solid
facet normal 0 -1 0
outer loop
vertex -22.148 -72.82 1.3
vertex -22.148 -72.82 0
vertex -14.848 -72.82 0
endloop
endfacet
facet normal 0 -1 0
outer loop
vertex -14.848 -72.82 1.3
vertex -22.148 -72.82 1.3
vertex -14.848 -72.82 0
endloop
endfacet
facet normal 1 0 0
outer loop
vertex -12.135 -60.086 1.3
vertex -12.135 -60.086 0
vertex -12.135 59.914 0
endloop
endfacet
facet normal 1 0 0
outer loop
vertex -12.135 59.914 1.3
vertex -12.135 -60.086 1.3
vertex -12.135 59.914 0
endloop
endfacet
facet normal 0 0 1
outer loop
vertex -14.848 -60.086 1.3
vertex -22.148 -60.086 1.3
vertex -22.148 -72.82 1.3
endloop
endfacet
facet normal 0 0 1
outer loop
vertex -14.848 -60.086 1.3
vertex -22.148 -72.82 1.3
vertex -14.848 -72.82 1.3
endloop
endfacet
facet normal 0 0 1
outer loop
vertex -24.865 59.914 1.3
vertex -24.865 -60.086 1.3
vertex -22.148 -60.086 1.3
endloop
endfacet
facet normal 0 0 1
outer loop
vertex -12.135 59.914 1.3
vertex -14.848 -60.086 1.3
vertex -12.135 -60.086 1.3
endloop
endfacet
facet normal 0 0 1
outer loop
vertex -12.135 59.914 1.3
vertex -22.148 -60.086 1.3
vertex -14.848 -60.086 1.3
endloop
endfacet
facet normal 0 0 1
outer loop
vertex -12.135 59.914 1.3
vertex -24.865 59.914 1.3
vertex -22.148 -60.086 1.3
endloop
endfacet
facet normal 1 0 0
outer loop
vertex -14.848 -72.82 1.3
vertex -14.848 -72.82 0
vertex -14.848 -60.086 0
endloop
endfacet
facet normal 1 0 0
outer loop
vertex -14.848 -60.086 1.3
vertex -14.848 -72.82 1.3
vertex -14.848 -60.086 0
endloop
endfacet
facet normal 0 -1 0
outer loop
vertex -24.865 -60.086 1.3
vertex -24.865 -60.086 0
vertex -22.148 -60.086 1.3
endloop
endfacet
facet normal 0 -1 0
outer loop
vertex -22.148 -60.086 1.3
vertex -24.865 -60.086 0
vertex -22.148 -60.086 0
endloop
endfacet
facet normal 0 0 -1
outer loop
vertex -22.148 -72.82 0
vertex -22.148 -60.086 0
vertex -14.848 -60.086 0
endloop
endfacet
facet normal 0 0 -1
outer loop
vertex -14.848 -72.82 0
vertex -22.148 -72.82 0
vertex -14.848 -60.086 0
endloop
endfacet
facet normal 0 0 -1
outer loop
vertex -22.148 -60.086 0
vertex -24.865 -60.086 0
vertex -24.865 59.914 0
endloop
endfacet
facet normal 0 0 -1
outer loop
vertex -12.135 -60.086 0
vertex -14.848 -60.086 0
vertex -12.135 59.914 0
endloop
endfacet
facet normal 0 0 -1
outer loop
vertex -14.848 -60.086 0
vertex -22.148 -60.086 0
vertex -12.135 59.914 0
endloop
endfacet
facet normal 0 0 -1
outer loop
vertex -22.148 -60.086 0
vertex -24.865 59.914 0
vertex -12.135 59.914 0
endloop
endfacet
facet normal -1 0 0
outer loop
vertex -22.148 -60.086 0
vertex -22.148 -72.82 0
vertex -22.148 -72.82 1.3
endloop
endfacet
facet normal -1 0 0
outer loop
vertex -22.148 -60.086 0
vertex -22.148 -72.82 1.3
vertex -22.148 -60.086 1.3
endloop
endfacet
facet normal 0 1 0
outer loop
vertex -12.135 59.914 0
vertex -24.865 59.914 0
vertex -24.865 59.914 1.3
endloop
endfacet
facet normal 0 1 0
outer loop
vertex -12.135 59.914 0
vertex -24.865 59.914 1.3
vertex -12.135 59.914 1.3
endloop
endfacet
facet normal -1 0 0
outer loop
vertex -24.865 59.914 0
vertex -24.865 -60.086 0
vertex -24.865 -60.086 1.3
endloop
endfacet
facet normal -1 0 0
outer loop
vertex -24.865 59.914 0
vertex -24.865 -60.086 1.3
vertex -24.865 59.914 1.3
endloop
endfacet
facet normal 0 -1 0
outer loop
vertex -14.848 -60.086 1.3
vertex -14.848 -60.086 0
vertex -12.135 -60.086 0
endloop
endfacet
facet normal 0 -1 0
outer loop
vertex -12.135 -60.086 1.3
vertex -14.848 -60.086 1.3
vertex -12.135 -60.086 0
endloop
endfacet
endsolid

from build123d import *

# Parameters (mm, degrees)
F0_W     = 12.73
F0_H     = 120
F1_DEPTH = 1.3
F2_W     = 7.3
F2_H     = 13
F3_DEPTH = 1.3


with BuildPart() as f1:
    # F0 (on Top) → F1 (new body)
    with BuildSketch(Plane.XY):
        with Locations((-18.500336, -0.08574)):
            Rectangle(F0_W, F0_H)
    extrude(amount=F1_DEPTH)

    # F2 (on Top) → F3 (join)
    with BuildSketch(Plane.XY):
        with Locations((-18.497536, -66.319867)):
            Rectangle(F2_W, F2_H)
    extrude(amount=F3_DEPTH)


solid = f1.part
